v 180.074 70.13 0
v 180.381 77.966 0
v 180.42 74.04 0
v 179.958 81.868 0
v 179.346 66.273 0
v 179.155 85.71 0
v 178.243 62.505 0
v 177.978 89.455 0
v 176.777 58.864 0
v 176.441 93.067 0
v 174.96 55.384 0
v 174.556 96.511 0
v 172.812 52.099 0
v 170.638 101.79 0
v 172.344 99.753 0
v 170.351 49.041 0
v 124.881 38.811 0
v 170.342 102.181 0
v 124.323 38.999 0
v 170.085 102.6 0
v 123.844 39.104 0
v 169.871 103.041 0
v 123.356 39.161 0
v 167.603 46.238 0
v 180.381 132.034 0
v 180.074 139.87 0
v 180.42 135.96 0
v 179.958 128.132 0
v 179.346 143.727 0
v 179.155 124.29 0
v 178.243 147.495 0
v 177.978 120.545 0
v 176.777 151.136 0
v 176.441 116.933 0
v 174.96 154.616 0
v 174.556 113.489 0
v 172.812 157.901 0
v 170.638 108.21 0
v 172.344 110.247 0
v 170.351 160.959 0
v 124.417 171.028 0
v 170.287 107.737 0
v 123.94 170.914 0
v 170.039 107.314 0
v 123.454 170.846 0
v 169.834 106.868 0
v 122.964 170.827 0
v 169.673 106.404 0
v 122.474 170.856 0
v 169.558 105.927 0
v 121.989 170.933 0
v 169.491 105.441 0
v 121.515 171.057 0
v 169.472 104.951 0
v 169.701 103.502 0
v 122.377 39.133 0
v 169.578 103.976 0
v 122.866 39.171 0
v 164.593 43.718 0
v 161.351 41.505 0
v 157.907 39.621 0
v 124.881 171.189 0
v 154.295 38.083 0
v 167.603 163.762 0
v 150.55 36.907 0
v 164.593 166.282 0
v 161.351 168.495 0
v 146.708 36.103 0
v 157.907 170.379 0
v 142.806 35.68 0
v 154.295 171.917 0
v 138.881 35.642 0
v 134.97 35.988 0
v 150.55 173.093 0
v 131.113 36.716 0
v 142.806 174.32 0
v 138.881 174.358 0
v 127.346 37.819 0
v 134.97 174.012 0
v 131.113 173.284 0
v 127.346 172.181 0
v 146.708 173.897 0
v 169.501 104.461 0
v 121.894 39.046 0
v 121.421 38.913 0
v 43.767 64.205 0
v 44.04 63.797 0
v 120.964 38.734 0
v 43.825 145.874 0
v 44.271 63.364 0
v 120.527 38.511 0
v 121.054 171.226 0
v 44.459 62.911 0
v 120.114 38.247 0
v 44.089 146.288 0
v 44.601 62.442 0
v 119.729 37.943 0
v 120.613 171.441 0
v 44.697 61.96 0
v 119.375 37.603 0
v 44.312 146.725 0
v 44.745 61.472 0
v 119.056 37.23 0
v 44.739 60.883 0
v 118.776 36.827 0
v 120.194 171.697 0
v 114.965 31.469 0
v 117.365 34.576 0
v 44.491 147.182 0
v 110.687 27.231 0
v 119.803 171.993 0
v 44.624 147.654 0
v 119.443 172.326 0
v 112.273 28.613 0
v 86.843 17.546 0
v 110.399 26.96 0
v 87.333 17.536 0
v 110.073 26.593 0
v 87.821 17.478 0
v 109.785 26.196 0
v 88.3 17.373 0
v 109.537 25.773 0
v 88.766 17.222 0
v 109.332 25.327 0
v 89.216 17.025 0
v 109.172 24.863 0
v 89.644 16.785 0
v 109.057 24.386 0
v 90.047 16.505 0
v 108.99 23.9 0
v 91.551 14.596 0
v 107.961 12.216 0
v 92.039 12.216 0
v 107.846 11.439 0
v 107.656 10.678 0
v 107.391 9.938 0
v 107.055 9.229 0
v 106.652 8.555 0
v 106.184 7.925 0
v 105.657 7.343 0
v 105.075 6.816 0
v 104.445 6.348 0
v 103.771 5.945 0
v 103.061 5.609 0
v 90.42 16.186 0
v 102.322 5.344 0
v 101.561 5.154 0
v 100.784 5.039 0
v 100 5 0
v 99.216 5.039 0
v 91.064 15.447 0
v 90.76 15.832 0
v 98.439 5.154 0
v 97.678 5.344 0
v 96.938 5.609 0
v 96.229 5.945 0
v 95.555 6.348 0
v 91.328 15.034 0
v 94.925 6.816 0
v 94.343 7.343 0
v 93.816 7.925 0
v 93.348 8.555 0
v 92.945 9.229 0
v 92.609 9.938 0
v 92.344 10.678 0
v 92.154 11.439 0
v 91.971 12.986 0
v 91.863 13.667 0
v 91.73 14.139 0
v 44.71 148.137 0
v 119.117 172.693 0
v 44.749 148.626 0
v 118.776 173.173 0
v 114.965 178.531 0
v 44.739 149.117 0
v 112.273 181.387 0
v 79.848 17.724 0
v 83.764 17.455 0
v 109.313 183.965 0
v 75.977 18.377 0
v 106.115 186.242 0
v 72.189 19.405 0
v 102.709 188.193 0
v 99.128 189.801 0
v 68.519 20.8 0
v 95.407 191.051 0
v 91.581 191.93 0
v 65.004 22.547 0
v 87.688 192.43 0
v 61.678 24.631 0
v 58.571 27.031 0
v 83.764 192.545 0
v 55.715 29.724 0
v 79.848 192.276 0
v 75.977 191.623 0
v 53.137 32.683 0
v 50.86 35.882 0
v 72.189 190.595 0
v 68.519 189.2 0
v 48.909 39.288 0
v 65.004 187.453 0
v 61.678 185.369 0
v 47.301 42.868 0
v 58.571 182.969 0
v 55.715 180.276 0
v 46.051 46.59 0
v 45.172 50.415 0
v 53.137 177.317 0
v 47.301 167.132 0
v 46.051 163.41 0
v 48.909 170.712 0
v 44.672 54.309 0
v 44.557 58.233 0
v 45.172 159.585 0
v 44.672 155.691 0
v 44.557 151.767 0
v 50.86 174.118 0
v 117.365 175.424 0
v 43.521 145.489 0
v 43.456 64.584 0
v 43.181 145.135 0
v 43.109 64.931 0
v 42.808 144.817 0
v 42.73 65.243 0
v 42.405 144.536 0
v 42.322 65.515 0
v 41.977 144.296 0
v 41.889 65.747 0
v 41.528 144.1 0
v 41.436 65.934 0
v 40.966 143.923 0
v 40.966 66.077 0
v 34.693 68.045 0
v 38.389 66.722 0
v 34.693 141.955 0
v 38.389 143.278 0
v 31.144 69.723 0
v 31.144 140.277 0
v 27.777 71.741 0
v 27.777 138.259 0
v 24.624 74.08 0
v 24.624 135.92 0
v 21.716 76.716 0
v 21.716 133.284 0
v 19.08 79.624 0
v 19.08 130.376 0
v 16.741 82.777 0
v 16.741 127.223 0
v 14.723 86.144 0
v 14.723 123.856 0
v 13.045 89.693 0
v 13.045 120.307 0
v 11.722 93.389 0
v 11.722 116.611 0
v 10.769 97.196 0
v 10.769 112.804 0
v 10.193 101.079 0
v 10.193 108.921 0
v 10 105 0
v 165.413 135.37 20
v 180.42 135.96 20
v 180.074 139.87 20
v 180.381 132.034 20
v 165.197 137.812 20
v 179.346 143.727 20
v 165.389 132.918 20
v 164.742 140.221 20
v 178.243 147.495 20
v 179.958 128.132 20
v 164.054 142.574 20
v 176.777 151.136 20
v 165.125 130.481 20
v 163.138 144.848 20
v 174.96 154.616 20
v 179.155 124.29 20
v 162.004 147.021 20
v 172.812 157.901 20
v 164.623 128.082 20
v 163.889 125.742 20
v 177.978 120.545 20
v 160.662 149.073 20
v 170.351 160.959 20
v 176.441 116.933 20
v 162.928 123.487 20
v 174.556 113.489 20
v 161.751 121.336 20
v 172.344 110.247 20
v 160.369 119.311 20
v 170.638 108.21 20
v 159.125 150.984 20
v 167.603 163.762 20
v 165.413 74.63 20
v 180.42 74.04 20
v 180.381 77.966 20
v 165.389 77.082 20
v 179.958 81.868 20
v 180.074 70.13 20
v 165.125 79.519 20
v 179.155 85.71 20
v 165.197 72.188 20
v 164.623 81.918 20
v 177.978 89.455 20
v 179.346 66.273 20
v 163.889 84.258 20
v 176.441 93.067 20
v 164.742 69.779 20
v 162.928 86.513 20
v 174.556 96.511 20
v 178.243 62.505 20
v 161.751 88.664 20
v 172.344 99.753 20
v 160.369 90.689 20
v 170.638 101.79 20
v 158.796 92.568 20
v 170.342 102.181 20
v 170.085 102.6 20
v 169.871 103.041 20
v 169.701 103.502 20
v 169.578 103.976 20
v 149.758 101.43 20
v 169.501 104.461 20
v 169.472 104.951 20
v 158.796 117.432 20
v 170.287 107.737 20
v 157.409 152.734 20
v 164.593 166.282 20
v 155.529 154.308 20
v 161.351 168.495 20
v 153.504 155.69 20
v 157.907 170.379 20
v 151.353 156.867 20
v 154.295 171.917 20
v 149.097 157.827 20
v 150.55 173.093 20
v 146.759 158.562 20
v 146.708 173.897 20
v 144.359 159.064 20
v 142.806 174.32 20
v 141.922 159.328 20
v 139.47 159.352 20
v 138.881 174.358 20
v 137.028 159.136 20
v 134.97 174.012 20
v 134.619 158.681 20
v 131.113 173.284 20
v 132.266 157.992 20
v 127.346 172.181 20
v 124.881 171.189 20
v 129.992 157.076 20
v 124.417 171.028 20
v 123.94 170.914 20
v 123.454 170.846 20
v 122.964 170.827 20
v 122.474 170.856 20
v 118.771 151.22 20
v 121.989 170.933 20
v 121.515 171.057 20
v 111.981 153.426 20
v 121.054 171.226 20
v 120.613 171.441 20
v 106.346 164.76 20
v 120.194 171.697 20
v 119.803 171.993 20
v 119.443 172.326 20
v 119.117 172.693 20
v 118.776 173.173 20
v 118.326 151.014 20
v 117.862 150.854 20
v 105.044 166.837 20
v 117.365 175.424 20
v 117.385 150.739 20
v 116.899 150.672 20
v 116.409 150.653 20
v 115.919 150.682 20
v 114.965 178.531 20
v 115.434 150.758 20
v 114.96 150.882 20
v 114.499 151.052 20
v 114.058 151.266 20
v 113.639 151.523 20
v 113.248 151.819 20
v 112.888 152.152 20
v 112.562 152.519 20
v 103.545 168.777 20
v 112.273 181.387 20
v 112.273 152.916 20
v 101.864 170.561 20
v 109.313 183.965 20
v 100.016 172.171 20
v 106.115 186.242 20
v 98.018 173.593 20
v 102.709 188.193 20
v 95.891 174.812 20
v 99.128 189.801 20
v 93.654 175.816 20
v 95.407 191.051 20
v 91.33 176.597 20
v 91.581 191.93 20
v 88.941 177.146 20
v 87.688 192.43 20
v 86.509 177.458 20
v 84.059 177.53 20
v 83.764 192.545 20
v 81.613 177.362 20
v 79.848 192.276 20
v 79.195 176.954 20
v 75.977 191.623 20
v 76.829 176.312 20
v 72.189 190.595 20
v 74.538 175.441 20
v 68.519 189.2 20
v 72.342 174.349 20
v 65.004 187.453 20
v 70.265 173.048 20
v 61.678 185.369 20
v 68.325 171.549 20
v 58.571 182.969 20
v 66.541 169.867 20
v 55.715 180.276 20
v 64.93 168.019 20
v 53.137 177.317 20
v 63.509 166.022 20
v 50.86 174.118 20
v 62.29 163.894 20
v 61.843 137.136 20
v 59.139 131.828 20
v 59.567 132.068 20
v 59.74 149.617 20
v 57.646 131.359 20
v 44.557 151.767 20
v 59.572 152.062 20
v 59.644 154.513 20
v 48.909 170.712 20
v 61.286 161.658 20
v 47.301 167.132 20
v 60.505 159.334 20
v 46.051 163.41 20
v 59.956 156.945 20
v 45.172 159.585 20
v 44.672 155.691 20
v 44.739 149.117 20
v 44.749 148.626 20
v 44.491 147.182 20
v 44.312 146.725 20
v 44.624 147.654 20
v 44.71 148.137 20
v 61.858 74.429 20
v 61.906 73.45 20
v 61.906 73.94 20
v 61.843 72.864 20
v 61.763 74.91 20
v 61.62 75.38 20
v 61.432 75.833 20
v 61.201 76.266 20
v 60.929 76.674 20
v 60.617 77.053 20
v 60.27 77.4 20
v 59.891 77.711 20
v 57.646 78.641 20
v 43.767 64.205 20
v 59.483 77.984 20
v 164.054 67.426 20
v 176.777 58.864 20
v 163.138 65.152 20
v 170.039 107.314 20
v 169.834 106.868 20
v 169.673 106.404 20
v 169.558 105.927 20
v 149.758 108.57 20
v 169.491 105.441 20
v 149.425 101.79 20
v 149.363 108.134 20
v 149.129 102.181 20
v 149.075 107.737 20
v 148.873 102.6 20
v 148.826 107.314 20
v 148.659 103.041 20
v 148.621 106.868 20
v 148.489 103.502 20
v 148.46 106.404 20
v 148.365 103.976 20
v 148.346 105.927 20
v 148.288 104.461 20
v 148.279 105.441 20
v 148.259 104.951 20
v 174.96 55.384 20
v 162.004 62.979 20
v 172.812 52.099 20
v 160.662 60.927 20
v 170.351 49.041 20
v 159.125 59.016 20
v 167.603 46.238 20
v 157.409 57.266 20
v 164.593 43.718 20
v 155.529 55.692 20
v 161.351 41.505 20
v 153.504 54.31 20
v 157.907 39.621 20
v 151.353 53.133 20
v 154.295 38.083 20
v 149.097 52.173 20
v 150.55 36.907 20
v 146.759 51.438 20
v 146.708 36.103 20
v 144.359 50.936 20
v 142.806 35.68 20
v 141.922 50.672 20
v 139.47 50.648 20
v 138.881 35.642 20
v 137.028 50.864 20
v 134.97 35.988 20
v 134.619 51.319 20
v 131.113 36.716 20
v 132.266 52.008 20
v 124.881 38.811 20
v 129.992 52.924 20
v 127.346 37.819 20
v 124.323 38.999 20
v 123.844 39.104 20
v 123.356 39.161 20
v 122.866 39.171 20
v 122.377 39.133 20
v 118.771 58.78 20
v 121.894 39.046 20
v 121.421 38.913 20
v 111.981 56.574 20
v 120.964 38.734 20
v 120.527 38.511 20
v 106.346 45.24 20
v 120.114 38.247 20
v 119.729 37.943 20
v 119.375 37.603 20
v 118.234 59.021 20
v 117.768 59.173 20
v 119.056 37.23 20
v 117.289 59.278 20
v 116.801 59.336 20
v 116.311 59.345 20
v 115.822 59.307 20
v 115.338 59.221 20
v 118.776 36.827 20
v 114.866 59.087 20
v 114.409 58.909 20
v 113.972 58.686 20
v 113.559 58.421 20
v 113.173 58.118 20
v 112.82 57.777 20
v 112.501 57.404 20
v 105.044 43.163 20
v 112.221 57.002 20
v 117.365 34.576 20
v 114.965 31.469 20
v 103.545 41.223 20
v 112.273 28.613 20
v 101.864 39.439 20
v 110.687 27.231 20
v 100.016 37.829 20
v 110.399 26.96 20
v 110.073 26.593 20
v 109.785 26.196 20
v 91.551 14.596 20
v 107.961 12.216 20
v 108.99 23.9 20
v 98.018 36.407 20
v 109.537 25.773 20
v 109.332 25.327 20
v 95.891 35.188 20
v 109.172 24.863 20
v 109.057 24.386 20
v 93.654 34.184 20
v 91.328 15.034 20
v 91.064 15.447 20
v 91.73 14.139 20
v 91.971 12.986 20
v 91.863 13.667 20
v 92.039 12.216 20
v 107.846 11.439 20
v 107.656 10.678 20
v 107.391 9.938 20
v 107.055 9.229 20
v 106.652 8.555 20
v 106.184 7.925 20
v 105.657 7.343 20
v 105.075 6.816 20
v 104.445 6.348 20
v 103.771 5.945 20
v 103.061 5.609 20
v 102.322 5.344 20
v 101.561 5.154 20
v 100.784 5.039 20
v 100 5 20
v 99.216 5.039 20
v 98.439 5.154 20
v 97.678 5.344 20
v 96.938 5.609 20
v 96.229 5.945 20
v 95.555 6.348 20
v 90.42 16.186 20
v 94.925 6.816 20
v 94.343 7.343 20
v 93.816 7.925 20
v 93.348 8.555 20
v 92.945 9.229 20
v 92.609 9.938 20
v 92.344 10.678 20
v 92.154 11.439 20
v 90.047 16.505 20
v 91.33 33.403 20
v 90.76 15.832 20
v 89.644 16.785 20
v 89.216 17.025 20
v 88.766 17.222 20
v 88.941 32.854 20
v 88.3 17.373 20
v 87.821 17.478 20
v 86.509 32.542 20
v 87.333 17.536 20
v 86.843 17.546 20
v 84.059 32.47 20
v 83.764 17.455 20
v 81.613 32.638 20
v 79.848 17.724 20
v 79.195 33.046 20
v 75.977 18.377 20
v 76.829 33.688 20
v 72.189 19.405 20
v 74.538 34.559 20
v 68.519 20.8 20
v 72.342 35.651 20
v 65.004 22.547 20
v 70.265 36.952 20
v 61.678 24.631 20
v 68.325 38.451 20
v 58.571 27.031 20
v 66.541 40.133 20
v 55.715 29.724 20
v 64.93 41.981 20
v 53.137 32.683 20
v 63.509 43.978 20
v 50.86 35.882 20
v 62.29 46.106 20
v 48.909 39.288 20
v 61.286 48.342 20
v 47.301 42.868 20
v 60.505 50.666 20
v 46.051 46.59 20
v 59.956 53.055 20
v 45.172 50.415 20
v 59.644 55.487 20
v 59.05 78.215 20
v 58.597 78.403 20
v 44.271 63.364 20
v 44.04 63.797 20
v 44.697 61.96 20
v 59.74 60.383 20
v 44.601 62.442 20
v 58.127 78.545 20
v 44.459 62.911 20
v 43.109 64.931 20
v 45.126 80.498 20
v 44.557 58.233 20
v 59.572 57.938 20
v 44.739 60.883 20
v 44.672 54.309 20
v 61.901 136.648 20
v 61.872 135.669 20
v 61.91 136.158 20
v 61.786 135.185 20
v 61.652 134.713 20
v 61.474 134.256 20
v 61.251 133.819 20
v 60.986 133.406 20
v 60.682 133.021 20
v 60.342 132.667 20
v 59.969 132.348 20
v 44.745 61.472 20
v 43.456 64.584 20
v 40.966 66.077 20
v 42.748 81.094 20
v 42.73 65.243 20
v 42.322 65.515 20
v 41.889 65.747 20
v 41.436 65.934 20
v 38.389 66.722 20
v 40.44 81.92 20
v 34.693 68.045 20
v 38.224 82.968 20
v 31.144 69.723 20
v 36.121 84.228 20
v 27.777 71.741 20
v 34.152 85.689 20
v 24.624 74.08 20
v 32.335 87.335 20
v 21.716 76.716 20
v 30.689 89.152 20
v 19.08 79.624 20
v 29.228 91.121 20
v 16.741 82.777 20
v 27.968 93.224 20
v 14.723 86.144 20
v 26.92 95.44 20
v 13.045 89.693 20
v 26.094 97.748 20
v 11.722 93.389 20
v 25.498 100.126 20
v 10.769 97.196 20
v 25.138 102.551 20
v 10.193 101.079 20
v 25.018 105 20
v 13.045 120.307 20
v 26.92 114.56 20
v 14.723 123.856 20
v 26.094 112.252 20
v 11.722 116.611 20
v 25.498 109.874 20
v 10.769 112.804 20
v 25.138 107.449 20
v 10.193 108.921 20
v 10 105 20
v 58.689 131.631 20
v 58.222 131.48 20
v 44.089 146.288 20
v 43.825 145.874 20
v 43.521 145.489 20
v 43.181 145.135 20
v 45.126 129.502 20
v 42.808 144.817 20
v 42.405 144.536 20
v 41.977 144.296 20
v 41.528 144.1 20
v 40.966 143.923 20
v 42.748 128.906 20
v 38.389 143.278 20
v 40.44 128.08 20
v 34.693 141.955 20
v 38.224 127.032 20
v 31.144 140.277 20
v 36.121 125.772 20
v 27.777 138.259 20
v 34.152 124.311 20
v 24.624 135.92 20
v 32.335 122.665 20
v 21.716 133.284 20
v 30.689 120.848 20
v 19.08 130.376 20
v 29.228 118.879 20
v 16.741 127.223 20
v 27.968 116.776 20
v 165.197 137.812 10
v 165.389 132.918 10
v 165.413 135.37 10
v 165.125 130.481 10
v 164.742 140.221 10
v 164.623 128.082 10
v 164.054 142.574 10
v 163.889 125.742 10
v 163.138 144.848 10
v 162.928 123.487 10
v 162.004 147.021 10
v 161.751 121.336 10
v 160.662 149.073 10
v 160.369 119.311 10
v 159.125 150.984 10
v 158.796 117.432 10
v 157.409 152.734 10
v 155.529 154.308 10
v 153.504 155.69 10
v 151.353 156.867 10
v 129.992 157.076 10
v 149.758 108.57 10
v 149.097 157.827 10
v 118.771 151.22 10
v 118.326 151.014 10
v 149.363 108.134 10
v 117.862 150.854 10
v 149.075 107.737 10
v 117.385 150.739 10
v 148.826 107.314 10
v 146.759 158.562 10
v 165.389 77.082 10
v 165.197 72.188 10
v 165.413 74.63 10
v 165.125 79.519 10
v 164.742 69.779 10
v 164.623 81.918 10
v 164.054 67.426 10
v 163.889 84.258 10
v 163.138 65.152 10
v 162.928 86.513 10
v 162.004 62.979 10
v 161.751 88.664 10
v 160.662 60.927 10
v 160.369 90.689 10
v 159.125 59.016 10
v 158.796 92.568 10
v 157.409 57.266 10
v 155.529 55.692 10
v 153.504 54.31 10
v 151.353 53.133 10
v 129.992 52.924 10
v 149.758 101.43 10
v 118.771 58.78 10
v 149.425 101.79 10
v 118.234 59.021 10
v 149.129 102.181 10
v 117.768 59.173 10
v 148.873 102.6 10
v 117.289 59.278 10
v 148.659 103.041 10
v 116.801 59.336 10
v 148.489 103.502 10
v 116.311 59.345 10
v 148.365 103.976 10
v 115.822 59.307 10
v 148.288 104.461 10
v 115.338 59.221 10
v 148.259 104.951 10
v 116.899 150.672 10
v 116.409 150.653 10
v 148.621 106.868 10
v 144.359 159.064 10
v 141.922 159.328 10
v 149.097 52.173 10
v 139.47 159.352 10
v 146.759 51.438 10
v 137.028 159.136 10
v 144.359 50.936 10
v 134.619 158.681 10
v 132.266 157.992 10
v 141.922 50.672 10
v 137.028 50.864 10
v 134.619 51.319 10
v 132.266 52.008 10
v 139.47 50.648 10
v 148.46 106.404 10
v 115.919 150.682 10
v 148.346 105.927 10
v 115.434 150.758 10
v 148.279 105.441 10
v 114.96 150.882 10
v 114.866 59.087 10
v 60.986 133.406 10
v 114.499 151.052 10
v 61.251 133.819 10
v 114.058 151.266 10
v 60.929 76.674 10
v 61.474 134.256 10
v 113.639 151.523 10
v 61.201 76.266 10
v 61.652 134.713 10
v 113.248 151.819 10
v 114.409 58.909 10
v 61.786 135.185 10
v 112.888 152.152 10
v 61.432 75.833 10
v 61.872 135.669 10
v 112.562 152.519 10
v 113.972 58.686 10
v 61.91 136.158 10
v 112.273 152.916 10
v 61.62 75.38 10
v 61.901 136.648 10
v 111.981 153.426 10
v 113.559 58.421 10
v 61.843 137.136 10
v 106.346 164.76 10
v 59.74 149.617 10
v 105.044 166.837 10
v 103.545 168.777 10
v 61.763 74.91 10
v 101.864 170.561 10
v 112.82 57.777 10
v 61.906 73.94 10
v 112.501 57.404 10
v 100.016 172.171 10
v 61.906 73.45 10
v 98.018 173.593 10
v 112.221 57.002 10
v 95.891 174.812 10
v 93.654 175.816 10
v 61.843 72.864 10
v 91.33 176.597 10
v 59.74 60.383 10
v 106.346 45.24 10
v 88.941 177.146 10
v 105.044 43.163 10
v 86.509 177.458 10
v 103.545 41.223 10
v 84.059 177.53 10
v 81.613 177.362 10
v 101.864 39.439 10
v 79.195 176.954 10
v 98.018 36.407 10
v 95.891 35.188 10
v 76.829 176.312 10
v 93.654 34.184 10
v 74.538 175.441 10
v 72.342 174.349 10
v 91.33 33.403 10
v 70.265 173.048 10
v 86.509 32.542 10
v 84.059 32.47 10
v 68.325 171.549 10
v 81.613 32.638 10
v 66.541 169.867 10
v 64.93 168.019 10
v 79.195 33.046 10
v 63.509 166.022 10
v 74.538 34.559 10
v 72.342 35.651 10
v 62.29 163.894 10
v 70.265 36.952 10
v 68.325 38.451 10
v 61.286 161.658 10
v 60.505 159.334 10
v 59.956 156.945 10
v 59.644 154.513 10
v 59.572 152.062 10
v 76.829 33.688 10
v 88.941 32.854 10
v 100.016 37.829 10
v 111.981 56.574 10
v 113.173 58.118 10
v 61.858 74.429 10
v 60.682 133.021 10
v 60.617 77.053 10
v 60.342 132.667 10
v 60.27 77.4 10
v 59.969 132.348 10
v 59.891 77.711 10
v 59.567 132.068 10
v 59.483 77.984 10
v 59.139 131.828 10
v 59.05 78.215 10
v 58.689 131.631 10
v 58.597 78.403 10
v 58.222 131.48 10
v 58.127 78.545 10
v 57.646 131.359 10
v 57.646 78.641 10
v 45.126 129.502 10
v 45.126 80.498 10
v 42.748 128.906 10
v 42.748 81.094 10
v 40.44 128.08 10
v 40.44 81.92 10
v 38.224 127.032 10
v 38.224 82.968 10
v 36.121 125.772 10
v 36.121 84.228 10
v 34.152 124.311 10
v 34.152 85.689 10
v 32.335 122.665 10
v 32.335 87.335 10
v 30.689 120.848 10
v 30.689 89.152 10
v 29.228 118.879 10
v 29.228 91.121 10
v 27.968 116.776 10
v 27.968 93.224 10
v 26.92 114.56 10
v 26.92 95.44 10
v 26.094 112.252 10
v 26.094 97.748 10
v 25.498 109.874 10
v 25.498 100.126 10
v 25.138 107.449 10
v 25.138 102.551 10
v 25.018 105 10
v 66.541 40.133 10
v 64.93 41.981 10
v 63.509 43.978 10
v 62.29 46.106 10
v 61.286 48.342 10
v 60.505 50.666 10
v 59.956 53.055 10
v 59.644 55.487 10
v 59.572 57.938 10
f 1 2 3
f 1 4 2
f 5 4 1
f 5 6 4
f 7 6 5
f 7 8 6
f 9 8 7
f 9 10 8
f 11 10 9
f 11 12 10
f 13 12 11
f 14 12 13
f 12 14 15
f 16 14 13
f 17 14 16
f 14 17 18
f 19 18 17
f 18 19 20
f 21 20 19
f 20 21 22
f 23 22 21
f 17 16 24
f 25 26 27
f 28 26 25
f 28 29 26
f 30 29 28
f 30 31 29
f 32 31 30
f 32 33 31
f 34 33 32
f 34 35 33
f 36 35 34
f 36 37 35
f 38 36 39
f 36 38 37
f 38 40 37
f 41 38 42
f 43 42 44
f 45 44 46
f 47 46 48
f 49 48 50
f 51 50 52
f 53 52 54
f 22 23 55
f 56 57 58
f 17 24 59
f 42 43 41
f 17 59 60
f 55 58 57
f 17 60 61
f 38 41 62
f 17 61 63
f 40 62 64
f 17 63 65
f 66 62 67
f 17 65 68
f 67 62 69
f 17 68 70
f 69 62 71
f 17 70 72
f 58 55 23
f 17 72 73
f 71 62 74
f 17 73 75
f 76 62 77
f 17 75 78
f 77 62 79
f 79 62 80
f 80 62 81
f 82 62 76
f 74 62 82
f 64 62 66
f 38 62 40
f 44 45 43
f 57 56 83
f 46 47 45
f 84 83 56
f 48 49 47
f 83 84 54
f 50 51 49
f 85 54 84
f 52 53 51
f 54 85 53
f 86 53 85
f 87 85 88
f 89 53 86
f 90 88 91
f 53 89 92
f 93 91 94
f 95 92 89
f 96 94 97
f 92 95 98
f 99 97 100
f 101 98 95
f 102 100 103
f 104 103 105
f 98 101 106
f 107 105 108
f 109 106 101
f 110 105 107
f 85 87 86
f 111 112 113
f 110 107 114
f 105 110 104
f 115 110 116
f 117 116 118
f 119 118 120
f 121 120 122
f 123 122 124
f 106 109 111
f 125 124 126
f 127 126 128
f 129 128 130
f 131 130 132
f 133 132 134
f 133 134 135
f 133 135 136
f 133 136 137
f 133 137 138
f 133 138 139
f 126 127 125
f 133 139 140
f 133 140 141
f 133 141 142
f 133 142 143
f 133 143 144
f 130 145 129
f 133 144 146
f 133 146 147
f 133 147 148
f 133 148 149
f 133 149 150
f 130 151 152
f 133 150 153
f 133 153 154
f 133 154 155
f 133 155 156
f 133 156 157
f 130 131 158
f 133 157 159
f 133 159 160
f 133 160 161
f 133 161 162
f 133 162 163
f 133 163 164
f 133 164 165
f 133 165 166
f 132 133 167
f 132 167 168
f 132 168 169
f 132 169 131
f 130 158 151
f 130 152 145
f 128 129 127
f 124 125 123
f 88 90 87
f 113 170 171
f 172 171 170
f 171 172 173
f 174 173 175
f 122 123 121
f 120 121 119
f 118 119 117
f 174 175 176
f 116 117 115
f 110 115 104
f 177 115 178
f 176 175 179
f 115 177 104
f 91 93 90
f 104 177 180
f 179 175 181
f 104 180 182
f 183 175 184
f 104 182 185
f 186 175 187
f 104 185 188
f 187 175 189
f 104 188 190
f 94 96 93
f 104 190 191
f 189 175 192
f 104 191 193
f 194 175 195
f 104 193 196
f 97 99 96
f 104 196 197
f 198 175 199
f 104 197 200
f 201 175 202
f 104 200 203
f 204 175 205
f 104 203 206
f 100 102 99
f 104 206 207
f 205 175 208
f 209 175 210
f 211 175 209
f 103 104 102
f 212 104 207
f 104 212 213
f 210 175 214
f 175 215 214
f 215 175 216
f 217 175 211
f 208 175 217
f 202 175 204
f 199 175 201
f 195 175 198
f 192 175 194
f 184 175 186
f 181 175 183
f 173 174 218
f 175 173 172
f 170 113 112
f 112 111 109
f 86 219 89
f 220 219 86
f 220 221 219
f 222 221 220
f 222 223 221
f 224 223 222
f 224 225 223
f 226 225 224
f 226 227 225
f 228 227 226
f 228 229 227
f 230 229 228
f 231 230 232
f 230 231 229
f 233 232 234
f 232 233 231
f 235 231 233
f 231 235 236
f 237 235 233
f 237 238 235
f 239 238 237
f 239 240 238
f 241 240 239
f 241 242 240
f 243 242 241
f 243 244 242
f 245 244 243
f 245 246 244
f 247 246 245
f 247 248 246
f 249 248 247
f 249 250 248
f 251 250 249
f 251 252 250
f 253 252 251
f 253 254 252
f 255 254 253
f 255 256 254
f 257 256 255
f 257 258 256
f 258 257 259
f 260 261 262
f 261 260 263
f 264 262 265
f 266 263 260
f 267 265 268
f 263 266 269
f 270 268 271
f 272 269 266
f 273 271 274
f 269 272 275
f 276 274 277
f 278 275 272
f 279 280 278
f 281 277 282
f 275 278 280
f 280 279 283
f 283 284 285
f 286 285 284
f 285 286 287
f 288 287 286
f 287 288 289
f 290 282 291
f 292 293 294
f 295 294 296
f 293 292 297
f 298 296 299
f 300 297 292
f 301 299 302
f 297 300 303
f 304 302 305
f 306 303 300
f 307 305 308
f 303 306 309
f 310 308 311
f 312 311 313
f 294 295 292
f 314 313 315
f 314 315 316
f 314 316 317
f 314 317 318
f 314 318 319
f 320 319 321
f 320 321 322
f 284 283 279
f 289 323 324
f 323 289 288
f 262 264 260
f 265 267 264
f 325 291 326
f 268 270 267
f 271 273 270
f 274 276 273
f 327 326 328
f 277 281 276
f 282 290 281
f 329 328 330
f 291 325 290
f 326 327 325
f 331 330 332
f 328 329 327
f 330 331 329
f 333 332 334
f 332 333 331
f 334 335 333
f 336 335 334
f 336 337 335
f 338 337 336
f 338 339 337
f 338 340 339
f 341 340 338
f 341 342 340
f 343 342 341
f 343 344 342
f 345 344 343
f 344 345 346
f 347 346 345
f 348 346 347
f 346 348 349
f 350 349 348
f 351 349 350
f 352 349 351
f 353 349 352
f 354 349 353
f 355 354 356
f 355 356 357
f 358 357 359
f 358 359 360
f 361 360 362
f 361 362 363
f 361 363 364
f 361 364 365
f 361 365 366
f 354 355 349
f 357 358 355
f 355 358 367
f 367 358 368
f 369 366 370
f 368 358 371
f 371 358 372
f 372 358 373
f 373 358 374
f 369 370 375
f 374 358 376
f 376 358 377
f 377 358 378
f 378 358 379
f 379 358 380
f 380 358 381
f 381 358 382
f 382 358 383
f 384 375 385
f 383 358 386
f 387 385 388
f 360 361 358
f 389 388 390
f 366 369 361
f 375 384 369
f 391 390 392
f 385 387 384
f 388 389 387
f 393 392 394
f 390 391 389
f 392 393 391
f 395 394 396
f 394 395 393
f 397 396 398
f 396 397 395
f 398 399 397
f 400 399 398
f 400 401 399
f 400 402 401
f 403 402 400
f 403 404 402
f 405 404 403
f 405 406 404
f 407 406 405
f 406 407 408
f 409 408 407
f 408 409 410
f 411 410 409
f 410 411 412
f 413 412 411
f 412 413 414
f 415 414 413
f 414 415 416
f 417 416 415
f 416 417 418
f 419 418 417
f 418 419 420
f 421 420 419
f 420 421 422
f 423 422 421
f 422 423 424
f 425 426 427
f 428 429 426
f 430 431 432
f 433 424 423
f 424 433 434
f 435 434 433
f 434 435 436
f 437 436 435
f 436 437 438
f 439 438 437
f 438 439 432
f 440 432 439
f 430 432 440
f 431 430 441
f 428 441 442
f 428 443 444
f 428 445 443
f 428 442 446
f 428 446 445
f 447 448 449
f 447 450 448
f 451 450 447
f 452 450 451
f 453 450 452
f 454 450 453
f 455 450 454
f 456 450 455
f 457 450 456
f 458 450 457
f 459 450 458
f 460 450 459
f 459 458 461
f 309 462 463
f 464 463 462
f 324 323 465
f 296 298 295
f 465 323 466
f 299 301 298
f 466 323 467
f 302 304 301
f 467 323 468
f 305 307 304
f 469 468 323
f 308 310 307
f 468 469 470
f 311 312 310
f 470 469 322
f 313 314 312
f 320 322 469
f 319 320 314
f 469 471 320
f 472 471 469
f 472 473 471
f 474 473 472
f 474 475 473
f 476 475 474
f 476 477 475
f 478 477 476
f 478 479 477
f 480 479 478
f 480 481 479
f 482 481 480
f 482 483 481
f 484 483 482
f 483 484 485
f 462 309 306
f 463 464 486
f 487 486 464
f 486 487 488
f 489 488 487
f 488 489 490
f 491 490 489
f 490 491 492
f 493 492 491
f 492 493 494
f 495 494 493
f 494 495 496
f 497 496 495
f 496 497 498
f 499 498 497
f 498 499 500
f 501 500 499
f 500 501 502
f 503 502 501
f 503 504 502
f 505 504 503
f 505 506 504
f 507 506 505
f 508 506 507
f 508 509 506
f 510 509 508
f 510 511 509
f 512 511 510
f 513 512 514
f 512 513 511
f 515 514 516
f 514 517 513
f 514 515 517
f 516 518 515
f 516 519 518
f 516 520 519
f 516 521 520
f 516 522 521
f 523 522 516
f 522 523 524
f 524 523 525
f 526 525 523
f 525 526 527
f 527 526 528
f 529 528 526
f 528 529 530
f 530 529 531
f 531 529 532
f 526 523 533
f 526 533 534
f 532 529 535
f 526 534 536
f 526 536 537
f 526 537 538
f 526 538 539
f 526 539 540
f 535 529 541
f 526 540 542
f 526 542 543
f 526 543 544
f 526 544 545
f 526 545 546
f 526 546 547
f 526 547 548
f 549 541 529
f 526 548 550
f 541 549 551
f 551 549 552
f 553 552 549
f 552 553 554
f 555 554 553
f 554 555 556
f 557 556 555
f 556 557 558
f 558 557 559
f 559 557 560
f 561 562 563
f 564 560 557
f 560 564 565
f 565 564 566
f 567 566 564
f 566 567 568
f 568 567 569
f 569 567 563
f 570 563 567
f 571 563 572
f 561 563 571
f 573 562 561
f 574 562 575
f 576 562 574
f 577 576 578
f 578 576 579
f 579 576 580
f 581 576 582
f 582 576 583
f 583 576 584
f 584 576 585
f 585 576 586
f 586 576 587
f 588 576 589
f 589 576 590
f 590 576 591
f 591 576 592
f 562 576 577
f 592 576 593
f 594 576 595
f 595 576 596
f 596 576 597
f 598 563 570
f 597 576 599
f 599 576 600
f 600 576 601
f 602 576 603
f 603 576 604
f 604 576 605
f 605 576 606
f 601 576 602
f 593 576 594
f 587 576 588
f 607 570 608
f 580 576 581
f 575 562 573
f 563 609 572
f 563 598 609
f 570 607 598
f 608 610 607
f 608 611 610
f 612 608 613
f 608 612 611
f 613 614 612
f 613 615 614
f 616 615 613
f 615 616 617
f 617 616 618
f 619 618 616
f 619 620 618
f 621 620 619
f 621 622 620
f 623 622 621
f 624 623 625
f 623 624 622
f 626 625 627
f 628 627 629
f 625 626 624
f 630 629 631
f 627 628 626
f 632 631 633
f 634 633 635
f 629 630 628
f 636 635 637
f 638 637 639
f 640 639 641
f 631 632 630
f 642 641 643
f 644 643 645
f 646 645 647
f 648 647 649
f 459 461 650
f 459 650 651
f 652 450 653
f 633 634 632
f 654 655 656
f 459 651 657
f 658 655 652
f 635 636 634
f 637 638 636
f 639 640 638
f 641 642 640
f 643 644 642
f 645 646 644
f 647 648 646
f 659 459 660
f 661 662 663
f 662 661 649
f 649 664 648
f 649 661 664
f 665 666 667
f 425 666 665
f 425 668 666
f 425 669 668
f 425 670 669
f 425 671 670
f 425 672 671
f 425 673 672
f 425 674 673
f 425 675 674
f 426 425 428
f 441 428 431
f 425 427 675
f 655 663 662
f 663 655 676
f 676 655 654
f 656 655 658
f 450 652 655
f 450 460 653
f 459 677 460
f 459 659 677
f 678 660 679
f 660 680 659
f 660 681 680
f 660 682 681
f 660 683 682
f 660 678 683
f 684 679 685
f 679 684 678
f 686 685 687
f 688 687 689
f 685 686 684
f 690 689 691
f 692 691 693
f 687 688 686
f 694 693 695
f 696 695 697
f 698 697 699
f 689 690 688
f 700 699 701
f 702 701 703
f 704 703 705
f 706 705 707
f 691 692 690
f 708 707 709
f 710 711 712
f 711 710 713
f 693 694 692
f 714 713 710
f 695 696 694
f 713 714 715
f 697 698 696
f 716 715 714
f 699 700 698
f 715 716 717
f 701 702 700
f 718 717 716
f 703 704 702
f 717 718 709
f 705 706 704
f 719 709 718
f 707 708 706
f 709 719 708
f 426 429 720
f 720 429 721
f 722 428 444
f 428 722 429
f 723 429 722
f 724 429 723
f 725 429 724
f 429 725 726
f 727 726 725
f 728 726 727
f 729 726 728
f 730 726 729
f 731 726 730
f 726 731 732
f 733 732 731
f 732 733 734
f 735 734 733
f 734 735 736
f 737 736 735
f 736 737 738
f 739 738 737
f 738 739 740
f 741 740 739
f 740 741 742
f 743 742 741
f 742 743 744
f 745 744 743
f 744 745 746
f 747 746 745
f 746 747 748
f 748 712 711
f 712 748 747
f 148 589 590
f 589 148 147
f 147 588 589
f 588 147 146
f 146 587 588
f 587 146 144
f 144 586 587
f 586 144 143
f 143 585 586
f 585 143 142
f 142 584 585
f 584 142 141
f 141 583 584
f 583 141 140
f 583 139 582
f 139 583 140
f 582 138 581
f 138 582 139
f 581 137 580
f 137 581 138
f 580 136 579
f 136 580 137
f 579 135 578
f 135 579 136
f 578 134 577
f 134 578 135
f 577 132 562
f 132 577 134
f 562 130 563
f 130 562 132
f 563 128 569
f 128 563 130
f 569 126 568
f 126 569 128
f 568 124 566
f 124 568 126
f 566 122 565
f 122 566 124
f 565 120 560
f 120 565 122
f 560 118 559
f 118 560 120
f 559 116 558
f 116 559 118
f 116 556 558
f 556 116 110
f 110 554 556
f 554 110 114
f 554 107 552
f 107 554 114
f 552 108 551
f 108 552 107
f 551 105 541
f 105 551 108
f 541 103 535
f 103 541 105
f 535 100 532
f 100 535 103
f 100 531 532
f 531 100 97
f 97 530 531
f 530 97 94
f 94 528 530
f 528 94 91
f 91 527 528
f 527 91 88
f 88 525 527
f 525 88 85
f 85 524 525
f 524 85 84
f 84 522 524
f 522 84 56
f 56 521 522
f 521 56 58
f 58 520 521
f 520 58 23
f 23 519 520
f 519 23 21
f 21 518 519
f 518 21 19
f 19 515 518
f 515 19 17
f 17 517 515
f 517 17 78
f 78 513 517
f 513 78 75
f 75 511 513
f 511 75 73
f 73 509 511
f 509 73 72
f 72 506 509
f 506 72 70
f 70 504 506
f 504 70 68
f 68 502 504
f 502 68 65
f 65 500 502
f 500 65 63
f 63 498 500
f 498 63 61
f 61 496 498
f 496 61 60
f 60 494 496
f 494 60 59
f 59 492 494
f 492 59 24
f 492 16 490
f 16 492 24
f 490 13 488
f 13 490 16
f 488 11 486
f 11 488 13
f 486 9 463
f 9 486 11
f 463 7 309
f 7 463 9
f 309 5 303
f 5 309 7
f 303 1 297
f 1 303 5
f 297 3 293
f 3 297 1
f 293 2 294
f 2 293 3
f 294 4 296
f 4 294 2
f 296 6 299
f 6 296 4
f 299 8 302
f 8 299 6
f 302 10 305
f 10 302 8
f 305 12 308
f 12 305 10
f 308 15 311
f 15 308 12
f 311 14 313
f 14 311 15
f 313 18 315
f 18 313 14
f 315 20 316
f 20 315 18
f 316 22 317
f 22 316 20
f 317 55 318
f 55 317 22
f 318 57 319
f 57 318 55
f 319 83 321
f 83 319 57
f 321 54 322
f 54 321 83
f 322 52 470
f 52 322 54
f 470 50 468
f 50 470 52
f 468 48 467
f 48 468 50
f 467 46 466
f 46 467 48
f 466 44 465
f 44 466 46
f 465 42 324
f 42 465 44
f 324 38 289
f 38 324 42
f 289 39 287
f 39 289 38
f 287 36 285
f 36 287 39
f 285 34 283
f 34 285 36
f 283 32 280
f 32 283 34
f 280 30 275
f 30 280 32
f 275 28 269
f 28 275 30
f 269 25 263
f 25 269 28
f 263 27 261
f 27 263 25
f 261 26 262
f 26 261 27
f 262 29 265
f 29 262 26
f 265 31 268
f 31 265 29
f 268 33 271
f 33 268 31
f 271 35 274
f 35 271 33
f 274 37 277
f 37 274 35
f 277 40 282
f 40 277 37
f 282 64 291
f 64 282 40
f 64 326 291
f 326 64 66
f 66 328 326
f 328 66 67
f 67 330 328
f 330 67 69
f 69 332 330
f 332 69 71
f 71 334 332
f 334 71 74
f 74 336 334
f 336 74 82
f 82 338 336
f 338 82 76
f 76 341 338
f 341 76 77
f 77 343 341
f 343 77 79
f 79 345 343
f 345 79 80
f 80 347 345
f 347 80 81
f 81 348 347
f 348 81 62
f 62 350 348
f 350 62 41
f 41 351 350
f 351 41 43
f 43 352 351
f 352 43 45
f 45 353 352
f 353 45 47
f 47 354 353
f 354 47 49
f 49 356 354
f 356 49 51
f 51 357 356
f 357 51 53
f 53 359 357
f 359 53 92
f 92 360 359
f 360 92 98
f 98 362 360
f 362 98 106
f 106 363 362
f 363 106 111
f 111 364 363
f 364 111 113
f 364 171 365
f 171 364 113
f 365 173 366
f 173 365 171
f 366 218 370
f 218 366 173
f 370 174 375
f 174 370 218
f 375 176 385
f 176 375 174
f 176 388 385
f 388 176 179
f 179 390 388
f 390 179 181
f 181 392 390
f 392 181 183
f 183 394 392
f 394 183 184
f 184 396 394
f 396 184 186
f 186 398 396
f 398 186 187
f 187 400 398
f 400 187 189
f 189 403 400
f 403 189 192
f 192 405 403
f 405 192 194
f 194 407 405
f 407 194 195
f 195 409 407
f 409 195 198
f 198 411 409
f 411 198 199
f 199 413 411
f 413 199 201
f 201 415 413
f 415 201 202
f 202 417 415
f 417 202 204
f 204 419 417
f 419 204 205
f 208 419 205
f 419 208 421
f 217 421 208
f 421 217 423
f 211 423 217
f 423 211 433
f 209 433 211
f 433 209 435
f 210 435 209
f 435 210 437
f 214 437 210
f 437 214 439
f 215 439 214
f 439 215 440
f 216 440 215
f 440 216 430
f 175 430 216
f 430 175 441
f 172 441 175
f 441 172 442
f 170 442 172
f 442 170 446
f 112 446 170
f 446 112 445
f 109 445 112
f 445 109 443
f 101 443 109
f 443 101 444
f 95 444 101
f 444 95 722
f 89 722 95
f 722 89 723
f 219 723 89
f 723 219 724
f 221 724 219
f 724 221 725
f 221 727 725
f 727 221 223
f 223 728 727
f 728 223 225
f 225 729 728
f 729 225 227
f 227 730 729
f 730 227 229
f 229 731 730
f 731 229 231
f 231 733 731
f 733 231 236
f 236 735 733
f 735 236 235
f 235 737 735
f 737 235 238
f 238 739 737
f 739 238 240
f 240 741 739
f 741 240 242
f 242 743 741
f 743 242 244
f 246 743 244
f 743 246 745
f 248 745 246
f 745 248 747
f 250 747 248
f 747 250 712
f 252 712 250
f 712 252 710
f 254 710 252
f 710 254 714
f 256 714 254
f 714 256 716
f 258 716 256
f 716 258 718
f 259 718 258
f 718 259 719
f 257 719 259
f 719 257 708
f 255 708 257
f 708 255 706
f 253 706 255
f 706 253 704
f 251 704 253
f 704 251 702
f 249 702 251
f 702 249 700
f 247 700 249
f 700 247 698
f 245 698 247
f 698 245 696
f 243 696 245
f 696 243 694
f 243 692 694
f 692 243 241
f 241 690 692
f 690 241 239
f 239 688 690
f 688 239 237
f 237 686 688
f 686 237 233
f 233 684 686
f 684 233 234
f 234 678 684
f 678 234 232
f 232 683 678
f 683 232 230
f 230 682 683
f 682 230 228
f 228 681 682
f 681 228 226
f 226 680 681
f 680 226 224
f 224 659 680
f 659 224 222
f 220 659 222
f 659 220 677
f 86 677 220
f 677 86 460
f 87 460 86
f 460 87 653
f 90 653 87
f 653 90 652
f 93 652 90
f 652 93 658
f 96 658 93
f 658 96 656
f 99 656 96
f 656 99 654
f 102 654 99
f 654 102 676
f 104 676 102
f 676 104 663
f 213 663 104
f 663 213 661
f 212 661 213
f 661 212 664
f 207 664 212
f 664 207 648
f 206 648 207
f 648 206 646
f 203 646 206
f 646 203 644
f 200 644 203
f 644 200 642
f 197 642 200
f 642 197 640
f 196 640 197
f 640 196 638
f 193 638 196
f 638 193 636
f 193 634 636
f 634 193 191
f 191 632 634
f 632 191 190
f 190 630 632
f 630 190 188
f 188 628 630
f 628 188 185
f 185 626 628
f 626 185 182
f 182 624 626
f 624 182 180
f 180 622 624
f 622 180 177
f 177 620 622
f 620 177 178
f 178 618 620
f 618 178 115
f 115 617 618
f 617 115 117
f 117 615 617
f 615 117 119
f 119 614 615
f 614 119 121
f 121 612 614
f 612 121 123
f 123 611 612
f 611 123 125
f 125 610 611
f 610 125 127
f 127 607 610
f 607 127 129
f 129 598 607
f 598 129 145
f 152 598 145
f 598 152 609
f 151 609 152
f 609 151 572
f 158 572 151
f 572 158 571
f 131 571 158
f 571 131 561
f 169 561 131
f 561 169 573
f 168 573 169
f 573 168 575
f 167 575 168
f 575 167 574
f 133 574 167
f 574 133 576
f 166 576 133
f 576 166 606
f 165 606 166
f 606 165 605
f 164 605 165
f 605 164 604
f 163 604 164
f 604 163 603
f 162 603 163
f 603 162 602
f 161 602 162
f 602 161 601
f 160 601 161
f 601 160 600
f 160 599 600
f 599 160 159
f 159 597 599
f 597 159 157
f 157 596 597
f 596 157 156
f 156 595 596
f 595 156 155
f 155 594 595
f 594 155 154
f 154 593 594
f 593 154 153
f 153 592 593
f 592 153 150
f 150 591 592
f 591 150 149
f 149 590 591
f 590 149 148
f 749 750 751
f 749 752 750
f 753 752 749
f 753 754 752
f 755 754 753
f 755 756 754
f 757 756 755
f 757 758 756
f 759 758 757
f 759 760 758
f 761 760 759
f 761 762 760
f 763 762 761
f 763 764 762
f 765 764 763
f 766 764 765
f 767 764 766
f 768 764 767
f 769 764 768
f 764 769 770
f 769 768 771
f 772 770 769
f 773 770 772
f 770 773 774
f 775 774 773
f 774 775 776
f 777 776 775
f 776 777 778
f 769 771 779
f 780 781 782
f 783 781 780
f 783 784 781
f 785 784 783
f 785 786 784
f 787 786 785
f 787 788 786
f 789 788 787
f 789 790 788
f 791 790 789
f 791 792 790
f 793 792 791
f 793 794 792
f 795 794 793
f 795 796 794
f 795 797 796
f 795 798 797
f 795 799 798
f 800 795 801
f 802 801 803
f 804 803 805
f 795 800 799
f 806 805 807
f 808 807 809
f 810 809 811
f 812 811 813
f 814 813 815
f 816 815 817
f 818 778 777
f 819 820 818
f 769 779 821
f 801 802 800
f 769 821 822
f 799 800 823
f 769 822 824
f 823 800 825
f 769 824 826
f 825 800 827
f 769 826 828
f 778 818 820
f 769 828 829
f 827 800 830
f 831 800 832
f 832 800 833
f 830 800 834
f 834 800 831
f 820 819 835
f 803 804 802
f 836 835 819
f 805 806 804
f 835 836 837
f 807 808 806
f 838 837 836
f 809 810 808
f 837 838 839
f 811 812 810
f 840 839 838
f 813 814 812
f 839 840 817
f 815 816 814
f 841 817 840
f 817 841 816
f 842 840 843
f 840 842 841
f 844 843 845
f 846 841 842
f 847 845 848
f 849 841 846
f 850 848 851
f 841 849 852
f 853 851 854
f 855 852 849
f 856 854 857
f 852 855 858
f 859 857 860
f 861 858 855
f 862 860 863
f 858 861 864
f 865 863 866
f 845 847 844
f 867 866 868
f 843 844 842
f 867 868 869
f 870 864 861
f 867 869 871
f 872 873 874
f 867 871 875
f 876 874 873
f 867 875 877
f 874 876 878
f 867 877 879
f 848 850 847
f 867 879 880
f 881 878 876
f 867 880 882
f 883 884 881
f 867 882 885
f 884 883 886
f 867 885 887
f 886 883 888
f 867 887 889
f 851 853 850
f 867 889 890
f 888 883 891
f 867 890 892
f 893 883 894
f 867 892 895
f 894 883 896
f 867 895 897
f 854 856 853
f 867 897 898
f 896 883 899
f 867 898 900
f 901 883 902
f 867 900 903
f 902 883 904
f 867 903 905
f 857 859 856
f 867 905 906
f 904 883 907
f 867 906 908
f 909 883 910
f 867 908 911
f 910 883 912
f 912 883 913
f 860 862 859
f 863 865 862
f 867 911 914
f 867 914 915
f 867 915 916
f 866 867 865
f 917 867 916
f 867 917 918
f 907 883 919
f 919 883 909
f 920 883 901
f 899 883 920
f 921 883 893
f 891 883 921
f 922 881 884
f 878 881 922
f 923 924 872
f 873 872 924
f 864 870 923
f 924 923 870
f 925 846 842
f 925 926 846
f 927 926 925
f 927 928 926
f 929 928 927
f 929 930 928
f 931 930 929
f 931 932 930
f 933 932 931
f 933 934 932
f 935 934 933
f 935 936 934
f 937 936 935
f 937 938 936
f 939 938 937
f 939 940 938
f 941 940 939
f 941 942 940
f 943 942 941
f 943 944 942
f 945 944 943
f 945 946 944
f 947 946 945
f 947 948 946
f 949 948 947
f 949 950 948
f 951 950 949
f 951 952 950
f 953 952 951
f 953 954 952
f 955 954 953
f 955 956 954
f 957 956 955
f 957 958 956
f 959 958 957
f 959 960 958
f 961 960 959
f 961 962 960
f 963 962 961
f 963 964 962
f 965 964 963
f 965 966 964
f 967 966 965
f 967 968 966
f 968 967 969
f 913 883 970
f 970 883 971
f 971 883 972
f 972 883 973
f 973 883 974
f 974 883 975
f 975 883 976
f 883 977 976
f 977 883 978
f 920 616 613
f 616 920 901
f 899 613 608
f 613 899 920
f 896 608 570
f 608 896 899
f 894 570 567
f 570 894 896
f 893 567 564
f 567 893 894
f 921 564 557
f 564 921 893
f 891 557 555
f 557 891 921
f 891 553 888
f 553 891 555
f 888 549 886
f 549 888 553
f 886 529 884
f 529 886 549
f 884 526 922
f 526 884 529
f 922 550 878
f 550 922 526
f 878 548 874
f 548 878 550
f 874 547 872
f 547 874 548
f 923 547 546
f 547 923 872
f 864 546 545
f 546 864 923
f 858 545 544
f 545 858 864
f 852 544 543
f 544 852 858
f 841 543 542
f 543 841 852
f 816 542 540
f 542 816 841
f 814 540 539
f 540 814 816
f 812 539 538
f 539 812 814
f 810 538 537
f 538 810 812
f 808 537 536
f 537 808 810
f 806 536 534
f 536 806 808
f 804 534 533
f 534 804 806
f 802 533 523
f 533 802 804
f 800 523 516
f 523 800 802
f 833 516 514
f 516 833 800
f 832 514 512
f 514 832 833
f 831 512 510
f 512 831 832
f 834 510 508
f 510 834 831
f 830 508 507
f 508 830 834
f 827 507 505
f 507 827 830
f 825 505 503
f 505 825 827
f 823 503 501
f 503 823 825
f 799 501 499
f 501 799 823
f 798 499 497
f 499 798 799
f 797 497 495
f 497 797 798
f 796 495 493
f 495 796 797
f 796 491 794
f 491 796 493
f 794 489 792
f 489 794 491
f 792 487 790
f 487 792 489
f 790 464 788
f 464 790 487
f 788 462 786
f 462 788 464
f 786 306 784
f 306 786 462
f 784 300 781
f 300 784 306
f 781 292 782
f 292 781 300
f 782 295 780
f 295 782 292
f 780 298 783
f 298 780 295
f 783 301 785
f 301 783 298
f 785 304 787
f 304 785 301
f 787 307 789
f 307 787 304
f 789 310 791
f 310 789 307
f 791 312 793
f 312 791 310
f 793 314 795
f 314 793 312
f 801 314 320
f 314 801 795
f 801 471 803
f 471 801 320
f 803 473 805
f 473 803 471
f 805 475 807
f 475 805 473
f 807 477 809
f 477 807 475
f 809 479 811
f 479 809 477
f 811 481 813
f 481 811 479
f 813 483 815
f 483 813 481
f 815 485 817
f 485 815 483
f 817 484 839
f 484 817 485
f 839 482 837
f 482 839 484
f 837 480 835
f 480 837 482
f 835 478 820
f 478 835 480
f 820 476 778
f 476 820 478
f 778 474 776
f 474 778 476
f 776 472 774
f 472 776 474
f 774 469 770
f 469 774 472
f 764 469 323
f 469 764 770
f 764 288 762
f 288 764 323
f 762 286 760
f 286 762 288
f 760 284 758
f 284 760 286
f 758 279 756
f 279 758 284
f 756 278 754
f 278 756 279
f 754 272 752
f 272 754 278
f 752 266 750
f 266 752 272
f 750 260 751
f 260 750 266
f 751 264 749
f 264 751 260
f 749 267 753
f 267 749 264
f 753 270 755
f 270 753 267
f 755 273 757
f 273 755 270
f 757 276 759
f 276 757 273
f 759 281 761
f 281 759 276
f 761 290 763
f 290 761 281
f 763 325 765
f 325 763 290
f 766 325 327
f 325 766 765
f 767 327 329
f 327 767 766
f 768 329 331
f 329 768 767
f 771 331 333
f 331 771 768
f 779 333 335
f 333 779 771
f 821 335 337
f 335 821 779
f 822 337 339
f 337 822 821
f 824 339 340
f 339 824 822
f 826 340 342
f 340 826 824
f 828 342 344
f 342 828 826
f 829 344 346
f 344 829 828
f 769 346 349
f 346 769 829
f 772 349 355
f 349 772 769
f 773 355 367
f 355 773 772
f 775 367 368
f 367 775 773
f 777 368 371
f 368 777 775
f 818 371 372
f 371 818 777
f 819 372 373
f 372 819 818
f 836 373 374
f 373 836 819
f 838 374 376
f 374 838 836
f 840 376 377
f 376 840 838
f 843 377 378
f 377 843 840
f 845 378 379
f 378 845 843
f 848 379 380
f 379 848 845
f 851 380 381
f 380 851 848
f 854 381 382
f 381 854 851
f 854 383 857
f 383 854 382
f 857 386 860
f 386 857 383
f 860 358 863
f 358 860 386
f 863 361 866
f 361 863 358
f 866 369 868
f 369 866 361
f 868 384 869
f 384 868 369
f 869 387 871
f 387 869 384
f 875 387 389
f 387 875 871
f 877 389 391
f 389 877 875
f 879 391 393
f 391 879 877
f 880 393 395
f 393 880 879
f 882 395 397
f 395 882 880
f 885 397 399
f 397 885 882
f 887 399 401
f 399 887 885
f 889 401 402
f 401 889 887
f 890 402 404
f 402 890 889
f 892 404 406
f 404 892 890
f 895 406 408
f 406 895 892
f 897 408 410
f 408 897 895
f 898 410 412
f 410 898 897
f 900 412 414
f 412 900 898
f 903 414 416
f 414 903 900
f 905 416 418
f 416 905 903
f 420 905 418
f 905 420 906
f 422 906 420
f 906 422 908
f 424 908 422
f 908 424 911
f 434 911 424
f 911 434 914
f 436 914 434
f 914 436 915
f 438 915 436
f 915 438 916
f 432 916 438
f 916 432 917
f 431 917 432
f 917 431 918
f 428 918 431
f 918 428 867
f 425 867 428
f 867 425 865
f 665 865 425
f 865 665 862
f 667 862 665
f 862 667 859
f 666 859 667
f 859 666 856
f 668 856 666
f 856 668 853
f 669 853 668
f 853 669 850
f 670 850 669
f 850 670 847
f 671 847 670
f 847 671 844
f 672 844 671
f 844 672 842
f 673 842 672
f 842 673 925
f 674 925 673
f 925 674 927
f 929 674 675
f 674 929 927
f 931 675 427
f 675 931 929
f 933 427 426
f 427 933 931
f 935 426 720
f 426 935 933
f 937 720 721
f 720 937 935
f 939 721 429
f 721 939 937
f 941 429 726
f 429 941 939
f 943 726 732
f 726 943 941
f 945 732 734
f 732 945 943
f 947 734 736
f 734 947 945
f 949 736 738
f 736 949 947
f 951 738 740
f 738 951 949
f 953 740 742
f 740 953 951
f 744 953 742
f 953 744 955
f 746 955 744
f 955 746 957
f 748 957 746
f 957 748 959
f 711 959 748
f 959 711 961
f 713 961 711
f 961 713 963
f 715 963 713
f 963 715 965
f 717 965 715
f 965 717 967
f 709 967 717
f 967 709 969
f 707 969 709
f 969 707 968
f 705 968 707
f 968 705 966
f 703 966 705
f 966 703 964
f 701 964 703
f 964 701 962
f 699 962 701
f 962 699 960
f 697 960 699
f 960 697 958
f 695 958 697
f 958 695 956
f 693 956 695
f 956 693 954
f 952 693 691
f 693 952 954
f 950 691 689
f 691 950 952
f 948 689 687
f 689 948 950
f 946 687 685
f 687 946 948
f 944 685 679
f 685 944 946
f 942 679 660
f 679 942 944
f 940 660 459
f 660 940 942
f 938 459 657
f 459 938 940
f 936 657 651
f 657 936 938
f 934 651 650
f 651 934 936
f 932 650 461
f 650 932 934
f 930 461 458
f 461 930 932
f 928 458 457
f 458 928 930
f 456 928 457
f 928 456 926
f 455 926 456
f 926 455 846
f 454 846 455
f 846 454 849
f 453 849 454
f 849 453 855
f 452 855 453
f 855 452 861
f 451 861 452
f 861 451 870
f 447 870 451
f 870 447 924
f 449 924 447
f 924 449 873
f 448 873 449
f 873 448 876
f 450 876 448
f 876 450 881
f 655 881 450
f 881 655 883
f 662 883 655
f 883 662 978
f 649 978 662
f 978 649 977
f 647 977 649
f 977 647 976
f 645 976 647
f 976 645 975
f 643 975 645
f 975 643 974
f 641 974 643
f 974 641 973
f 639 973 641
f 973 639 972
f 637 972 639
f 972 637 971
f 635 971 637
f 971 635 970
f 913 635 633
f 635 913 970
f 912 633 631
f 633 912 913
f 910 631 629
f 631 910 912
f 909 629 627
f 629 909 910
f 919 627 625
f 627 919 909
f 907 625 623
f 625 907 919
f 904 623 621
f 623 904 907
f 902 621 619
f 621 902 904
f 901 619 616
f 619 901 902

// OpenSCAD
// === UNITS ===
// units: mm
// The sketch carries an explicit "MM" on the top dimension line, so every
// number below is millimetres. No inch fractions are present.

// === SKETCH TRANSCRIPTION ===
//   "200 MM"  (top dimension line, arrows to the box)  -> overall X extent of the
//                                                          freeform outline -> stock_x
//   "200"     (right dimension line, arrows to the box) -> overall Y extent of the
//                                                          freeform outline -> stock_y
//   freeform outline drawn inside the 200 x 200 box: a 5-lobe flower (rounded
//   lobes, rounded notches) with a tapered stem at the bottom
//                                                       -> petal_*, core_r, stem_*
//   "pocket"  (leader line pointing at the hatched inner flower) -> freeform
//   recess inset from the outline, flat floor            -> pocket1_*
//   (no side / section view is drawn -> no thickness and no pocket depth given)

// === PARAMETERS ===
stock_x = 200;               // overall part length (X), from "200 MM" top dimension
stock_y = 200;               // overall part width  (Y), from "200" right dimension
stock_z = 20;                // stock thickness            // TODO: verify - not shown on sketch

// --- outer freeform profile: 5-lobe flower with stem -------------------------
flower_cx = 100;             // flower centre X (centred in the 200 box)
flower_cy = 105;             // flower centre Y            // TODO: verify - estimated
petal_n     = 5;             // number of lobes            // TODO: verify - counted 5 on the sketch
petal_a0    = 36;            // angle of the first lobe, deg
petal_ring_r = 50;           // radius of the ring the lobes sit on
petal_r      = 40;           // lobe radius
core_r       = 45;           // central disc that ties the lobes together
notch_r      = 5;            // fillet radius of the notches between lobes (>= tool_r)

stem_base_x = 100;           // stem root X (inside the flower)
stem_base_y = 70;            // stem root Y
stem_base_r = 13;            // stem root half width
stem_tip_x  = 100;           // stem tip X                 // TODO: verify - sketch stem leans slightly left
stem_tip_y  = 13;            // stem tip Y
stem_tip_r  = 8;             // stem tip half width

// --- freeform pocket ----------------------------------------------------------
pocket1_rim      = 15;       // solid wall kept between the outline and the pocket
pocket1_depth    = 10;       // pocket depth = 0.5 * stock_z
pocket1_corner_r = 5;        // fillet of the pocket's inside corners (>= tool_r)

eps = 0.1;                   // cutter overshoot past the top face
tool_r = 3.175;              // 1/4 in end mill radius, used only for the checks

// === ASSUMPTIONS ===
// units: mm - the sketch says "MM" on the top dimension, so nothing is converted.
// The 200 x 200 square is read as the dimension box / bounding box around the
//   freeform flower, so the part outline is the FLOWER + stem, not the square.
//   (Alternative reading - a square board with a flower-shaped pocket - rejected
//   because the leader line marks only the hatched inner region as "pocket".)
// Thickness is not dimensioned anywhere (no side view) -> assumed 20 mm.
// Pocket depth is not dimensioned -> assumed 0.5 * stock_z = 10 mm (flat floor;
//   the sketch shows no rounded dish section).
// Rim width estimated at ~15 mm from the gap drawn between the two outlines.
// Lobe count read as 5; exact lobe radius / ring radius are estimates used to
//   fill the 200 x 200 box proportionally to the sketch.
// The stem is simplified to a straight tapered stub (the sketch shows it leaning
//   a few degrees to the left).
// Drawn inside corners are filleted up to notch_r / pocket1_corner_r so a
//   6.35 mm cutter can machine them (min inside corner radius = 3.175 mm).
// No juice groove, handle hole, slot or edge chamfer is drawn -> none modelled.

// === MODEL ===
$fn = 64;

// 5-lobe flower body, local coordinates around the flower centre
module flower_body_raw() {
    union() {
        circle(r = core_r);
        for (i = [0 : petal_n - 1])
            rotate(petal_a0 + i * 360 / petal_n)
                translate([petal_ring_r, 0]) circle(r = petal_r);
    }
}

// raw outline = flower body + tapered stem, in stock coordinates
module raw_outline() {
    union() {
        translate([flower_cx, flower_cy]) flower_body_raw();
        hull() {
            translate([stem_base_x, stem_base_y]) circle(r = stem_base_r);
            translate([stem_tip_x,  stem_tip_y ]) circle(r = stem_tip_r);
        }
    }
}

// outer profile: closing rounds the concave notches to notch_r
module outline2d() {
    offset(r = -notch_r) offset(delta = notch_r) raw_outline();
}

// pocket: flower body eroded by the rim, inside corners rounded
module pocket1_2d() {
    offset(r = -pocket1_corner_r) offset(delta = pocket1_corner_r)
        offset(delta = -pocket1_rim)
            translate([flower_cx, flower_cy]) flower_body_raw();
}

module board() {
    difference() {
        linear_extrude(height = stock_z) outline2d();
        translate([0, 0, stock_z - pocket1_depth])
            linear_extrude(height = pocket1_depth + eps) pocket1_2d();
    }
}

board();

// === CHECKS ===
// outline bbox X 10.0 .. 180.5, Y 5.0 .. 192.6 inside stock 200 x 200 -> OK
// pocket bbox X 25.0 .. 165.5, Y 32.5 .. 177.6 inside the outline -> OK
// min wall pocket-to-edge = pocket1_rim = 15.0 >= min_wall 6 -> OK
// inside corner radii: notch_r 5.0 and pocket1_corner_r 5.0 >= tool_r 3.175 -> OK
// material left under the blind pocket = stock_z - pocket1_depth = 10.0 = 50% of stock_z >= 30% -> OK
// pocket1_depth 10.0 <= 0.7 * stock_z = 14.0 -> OK
